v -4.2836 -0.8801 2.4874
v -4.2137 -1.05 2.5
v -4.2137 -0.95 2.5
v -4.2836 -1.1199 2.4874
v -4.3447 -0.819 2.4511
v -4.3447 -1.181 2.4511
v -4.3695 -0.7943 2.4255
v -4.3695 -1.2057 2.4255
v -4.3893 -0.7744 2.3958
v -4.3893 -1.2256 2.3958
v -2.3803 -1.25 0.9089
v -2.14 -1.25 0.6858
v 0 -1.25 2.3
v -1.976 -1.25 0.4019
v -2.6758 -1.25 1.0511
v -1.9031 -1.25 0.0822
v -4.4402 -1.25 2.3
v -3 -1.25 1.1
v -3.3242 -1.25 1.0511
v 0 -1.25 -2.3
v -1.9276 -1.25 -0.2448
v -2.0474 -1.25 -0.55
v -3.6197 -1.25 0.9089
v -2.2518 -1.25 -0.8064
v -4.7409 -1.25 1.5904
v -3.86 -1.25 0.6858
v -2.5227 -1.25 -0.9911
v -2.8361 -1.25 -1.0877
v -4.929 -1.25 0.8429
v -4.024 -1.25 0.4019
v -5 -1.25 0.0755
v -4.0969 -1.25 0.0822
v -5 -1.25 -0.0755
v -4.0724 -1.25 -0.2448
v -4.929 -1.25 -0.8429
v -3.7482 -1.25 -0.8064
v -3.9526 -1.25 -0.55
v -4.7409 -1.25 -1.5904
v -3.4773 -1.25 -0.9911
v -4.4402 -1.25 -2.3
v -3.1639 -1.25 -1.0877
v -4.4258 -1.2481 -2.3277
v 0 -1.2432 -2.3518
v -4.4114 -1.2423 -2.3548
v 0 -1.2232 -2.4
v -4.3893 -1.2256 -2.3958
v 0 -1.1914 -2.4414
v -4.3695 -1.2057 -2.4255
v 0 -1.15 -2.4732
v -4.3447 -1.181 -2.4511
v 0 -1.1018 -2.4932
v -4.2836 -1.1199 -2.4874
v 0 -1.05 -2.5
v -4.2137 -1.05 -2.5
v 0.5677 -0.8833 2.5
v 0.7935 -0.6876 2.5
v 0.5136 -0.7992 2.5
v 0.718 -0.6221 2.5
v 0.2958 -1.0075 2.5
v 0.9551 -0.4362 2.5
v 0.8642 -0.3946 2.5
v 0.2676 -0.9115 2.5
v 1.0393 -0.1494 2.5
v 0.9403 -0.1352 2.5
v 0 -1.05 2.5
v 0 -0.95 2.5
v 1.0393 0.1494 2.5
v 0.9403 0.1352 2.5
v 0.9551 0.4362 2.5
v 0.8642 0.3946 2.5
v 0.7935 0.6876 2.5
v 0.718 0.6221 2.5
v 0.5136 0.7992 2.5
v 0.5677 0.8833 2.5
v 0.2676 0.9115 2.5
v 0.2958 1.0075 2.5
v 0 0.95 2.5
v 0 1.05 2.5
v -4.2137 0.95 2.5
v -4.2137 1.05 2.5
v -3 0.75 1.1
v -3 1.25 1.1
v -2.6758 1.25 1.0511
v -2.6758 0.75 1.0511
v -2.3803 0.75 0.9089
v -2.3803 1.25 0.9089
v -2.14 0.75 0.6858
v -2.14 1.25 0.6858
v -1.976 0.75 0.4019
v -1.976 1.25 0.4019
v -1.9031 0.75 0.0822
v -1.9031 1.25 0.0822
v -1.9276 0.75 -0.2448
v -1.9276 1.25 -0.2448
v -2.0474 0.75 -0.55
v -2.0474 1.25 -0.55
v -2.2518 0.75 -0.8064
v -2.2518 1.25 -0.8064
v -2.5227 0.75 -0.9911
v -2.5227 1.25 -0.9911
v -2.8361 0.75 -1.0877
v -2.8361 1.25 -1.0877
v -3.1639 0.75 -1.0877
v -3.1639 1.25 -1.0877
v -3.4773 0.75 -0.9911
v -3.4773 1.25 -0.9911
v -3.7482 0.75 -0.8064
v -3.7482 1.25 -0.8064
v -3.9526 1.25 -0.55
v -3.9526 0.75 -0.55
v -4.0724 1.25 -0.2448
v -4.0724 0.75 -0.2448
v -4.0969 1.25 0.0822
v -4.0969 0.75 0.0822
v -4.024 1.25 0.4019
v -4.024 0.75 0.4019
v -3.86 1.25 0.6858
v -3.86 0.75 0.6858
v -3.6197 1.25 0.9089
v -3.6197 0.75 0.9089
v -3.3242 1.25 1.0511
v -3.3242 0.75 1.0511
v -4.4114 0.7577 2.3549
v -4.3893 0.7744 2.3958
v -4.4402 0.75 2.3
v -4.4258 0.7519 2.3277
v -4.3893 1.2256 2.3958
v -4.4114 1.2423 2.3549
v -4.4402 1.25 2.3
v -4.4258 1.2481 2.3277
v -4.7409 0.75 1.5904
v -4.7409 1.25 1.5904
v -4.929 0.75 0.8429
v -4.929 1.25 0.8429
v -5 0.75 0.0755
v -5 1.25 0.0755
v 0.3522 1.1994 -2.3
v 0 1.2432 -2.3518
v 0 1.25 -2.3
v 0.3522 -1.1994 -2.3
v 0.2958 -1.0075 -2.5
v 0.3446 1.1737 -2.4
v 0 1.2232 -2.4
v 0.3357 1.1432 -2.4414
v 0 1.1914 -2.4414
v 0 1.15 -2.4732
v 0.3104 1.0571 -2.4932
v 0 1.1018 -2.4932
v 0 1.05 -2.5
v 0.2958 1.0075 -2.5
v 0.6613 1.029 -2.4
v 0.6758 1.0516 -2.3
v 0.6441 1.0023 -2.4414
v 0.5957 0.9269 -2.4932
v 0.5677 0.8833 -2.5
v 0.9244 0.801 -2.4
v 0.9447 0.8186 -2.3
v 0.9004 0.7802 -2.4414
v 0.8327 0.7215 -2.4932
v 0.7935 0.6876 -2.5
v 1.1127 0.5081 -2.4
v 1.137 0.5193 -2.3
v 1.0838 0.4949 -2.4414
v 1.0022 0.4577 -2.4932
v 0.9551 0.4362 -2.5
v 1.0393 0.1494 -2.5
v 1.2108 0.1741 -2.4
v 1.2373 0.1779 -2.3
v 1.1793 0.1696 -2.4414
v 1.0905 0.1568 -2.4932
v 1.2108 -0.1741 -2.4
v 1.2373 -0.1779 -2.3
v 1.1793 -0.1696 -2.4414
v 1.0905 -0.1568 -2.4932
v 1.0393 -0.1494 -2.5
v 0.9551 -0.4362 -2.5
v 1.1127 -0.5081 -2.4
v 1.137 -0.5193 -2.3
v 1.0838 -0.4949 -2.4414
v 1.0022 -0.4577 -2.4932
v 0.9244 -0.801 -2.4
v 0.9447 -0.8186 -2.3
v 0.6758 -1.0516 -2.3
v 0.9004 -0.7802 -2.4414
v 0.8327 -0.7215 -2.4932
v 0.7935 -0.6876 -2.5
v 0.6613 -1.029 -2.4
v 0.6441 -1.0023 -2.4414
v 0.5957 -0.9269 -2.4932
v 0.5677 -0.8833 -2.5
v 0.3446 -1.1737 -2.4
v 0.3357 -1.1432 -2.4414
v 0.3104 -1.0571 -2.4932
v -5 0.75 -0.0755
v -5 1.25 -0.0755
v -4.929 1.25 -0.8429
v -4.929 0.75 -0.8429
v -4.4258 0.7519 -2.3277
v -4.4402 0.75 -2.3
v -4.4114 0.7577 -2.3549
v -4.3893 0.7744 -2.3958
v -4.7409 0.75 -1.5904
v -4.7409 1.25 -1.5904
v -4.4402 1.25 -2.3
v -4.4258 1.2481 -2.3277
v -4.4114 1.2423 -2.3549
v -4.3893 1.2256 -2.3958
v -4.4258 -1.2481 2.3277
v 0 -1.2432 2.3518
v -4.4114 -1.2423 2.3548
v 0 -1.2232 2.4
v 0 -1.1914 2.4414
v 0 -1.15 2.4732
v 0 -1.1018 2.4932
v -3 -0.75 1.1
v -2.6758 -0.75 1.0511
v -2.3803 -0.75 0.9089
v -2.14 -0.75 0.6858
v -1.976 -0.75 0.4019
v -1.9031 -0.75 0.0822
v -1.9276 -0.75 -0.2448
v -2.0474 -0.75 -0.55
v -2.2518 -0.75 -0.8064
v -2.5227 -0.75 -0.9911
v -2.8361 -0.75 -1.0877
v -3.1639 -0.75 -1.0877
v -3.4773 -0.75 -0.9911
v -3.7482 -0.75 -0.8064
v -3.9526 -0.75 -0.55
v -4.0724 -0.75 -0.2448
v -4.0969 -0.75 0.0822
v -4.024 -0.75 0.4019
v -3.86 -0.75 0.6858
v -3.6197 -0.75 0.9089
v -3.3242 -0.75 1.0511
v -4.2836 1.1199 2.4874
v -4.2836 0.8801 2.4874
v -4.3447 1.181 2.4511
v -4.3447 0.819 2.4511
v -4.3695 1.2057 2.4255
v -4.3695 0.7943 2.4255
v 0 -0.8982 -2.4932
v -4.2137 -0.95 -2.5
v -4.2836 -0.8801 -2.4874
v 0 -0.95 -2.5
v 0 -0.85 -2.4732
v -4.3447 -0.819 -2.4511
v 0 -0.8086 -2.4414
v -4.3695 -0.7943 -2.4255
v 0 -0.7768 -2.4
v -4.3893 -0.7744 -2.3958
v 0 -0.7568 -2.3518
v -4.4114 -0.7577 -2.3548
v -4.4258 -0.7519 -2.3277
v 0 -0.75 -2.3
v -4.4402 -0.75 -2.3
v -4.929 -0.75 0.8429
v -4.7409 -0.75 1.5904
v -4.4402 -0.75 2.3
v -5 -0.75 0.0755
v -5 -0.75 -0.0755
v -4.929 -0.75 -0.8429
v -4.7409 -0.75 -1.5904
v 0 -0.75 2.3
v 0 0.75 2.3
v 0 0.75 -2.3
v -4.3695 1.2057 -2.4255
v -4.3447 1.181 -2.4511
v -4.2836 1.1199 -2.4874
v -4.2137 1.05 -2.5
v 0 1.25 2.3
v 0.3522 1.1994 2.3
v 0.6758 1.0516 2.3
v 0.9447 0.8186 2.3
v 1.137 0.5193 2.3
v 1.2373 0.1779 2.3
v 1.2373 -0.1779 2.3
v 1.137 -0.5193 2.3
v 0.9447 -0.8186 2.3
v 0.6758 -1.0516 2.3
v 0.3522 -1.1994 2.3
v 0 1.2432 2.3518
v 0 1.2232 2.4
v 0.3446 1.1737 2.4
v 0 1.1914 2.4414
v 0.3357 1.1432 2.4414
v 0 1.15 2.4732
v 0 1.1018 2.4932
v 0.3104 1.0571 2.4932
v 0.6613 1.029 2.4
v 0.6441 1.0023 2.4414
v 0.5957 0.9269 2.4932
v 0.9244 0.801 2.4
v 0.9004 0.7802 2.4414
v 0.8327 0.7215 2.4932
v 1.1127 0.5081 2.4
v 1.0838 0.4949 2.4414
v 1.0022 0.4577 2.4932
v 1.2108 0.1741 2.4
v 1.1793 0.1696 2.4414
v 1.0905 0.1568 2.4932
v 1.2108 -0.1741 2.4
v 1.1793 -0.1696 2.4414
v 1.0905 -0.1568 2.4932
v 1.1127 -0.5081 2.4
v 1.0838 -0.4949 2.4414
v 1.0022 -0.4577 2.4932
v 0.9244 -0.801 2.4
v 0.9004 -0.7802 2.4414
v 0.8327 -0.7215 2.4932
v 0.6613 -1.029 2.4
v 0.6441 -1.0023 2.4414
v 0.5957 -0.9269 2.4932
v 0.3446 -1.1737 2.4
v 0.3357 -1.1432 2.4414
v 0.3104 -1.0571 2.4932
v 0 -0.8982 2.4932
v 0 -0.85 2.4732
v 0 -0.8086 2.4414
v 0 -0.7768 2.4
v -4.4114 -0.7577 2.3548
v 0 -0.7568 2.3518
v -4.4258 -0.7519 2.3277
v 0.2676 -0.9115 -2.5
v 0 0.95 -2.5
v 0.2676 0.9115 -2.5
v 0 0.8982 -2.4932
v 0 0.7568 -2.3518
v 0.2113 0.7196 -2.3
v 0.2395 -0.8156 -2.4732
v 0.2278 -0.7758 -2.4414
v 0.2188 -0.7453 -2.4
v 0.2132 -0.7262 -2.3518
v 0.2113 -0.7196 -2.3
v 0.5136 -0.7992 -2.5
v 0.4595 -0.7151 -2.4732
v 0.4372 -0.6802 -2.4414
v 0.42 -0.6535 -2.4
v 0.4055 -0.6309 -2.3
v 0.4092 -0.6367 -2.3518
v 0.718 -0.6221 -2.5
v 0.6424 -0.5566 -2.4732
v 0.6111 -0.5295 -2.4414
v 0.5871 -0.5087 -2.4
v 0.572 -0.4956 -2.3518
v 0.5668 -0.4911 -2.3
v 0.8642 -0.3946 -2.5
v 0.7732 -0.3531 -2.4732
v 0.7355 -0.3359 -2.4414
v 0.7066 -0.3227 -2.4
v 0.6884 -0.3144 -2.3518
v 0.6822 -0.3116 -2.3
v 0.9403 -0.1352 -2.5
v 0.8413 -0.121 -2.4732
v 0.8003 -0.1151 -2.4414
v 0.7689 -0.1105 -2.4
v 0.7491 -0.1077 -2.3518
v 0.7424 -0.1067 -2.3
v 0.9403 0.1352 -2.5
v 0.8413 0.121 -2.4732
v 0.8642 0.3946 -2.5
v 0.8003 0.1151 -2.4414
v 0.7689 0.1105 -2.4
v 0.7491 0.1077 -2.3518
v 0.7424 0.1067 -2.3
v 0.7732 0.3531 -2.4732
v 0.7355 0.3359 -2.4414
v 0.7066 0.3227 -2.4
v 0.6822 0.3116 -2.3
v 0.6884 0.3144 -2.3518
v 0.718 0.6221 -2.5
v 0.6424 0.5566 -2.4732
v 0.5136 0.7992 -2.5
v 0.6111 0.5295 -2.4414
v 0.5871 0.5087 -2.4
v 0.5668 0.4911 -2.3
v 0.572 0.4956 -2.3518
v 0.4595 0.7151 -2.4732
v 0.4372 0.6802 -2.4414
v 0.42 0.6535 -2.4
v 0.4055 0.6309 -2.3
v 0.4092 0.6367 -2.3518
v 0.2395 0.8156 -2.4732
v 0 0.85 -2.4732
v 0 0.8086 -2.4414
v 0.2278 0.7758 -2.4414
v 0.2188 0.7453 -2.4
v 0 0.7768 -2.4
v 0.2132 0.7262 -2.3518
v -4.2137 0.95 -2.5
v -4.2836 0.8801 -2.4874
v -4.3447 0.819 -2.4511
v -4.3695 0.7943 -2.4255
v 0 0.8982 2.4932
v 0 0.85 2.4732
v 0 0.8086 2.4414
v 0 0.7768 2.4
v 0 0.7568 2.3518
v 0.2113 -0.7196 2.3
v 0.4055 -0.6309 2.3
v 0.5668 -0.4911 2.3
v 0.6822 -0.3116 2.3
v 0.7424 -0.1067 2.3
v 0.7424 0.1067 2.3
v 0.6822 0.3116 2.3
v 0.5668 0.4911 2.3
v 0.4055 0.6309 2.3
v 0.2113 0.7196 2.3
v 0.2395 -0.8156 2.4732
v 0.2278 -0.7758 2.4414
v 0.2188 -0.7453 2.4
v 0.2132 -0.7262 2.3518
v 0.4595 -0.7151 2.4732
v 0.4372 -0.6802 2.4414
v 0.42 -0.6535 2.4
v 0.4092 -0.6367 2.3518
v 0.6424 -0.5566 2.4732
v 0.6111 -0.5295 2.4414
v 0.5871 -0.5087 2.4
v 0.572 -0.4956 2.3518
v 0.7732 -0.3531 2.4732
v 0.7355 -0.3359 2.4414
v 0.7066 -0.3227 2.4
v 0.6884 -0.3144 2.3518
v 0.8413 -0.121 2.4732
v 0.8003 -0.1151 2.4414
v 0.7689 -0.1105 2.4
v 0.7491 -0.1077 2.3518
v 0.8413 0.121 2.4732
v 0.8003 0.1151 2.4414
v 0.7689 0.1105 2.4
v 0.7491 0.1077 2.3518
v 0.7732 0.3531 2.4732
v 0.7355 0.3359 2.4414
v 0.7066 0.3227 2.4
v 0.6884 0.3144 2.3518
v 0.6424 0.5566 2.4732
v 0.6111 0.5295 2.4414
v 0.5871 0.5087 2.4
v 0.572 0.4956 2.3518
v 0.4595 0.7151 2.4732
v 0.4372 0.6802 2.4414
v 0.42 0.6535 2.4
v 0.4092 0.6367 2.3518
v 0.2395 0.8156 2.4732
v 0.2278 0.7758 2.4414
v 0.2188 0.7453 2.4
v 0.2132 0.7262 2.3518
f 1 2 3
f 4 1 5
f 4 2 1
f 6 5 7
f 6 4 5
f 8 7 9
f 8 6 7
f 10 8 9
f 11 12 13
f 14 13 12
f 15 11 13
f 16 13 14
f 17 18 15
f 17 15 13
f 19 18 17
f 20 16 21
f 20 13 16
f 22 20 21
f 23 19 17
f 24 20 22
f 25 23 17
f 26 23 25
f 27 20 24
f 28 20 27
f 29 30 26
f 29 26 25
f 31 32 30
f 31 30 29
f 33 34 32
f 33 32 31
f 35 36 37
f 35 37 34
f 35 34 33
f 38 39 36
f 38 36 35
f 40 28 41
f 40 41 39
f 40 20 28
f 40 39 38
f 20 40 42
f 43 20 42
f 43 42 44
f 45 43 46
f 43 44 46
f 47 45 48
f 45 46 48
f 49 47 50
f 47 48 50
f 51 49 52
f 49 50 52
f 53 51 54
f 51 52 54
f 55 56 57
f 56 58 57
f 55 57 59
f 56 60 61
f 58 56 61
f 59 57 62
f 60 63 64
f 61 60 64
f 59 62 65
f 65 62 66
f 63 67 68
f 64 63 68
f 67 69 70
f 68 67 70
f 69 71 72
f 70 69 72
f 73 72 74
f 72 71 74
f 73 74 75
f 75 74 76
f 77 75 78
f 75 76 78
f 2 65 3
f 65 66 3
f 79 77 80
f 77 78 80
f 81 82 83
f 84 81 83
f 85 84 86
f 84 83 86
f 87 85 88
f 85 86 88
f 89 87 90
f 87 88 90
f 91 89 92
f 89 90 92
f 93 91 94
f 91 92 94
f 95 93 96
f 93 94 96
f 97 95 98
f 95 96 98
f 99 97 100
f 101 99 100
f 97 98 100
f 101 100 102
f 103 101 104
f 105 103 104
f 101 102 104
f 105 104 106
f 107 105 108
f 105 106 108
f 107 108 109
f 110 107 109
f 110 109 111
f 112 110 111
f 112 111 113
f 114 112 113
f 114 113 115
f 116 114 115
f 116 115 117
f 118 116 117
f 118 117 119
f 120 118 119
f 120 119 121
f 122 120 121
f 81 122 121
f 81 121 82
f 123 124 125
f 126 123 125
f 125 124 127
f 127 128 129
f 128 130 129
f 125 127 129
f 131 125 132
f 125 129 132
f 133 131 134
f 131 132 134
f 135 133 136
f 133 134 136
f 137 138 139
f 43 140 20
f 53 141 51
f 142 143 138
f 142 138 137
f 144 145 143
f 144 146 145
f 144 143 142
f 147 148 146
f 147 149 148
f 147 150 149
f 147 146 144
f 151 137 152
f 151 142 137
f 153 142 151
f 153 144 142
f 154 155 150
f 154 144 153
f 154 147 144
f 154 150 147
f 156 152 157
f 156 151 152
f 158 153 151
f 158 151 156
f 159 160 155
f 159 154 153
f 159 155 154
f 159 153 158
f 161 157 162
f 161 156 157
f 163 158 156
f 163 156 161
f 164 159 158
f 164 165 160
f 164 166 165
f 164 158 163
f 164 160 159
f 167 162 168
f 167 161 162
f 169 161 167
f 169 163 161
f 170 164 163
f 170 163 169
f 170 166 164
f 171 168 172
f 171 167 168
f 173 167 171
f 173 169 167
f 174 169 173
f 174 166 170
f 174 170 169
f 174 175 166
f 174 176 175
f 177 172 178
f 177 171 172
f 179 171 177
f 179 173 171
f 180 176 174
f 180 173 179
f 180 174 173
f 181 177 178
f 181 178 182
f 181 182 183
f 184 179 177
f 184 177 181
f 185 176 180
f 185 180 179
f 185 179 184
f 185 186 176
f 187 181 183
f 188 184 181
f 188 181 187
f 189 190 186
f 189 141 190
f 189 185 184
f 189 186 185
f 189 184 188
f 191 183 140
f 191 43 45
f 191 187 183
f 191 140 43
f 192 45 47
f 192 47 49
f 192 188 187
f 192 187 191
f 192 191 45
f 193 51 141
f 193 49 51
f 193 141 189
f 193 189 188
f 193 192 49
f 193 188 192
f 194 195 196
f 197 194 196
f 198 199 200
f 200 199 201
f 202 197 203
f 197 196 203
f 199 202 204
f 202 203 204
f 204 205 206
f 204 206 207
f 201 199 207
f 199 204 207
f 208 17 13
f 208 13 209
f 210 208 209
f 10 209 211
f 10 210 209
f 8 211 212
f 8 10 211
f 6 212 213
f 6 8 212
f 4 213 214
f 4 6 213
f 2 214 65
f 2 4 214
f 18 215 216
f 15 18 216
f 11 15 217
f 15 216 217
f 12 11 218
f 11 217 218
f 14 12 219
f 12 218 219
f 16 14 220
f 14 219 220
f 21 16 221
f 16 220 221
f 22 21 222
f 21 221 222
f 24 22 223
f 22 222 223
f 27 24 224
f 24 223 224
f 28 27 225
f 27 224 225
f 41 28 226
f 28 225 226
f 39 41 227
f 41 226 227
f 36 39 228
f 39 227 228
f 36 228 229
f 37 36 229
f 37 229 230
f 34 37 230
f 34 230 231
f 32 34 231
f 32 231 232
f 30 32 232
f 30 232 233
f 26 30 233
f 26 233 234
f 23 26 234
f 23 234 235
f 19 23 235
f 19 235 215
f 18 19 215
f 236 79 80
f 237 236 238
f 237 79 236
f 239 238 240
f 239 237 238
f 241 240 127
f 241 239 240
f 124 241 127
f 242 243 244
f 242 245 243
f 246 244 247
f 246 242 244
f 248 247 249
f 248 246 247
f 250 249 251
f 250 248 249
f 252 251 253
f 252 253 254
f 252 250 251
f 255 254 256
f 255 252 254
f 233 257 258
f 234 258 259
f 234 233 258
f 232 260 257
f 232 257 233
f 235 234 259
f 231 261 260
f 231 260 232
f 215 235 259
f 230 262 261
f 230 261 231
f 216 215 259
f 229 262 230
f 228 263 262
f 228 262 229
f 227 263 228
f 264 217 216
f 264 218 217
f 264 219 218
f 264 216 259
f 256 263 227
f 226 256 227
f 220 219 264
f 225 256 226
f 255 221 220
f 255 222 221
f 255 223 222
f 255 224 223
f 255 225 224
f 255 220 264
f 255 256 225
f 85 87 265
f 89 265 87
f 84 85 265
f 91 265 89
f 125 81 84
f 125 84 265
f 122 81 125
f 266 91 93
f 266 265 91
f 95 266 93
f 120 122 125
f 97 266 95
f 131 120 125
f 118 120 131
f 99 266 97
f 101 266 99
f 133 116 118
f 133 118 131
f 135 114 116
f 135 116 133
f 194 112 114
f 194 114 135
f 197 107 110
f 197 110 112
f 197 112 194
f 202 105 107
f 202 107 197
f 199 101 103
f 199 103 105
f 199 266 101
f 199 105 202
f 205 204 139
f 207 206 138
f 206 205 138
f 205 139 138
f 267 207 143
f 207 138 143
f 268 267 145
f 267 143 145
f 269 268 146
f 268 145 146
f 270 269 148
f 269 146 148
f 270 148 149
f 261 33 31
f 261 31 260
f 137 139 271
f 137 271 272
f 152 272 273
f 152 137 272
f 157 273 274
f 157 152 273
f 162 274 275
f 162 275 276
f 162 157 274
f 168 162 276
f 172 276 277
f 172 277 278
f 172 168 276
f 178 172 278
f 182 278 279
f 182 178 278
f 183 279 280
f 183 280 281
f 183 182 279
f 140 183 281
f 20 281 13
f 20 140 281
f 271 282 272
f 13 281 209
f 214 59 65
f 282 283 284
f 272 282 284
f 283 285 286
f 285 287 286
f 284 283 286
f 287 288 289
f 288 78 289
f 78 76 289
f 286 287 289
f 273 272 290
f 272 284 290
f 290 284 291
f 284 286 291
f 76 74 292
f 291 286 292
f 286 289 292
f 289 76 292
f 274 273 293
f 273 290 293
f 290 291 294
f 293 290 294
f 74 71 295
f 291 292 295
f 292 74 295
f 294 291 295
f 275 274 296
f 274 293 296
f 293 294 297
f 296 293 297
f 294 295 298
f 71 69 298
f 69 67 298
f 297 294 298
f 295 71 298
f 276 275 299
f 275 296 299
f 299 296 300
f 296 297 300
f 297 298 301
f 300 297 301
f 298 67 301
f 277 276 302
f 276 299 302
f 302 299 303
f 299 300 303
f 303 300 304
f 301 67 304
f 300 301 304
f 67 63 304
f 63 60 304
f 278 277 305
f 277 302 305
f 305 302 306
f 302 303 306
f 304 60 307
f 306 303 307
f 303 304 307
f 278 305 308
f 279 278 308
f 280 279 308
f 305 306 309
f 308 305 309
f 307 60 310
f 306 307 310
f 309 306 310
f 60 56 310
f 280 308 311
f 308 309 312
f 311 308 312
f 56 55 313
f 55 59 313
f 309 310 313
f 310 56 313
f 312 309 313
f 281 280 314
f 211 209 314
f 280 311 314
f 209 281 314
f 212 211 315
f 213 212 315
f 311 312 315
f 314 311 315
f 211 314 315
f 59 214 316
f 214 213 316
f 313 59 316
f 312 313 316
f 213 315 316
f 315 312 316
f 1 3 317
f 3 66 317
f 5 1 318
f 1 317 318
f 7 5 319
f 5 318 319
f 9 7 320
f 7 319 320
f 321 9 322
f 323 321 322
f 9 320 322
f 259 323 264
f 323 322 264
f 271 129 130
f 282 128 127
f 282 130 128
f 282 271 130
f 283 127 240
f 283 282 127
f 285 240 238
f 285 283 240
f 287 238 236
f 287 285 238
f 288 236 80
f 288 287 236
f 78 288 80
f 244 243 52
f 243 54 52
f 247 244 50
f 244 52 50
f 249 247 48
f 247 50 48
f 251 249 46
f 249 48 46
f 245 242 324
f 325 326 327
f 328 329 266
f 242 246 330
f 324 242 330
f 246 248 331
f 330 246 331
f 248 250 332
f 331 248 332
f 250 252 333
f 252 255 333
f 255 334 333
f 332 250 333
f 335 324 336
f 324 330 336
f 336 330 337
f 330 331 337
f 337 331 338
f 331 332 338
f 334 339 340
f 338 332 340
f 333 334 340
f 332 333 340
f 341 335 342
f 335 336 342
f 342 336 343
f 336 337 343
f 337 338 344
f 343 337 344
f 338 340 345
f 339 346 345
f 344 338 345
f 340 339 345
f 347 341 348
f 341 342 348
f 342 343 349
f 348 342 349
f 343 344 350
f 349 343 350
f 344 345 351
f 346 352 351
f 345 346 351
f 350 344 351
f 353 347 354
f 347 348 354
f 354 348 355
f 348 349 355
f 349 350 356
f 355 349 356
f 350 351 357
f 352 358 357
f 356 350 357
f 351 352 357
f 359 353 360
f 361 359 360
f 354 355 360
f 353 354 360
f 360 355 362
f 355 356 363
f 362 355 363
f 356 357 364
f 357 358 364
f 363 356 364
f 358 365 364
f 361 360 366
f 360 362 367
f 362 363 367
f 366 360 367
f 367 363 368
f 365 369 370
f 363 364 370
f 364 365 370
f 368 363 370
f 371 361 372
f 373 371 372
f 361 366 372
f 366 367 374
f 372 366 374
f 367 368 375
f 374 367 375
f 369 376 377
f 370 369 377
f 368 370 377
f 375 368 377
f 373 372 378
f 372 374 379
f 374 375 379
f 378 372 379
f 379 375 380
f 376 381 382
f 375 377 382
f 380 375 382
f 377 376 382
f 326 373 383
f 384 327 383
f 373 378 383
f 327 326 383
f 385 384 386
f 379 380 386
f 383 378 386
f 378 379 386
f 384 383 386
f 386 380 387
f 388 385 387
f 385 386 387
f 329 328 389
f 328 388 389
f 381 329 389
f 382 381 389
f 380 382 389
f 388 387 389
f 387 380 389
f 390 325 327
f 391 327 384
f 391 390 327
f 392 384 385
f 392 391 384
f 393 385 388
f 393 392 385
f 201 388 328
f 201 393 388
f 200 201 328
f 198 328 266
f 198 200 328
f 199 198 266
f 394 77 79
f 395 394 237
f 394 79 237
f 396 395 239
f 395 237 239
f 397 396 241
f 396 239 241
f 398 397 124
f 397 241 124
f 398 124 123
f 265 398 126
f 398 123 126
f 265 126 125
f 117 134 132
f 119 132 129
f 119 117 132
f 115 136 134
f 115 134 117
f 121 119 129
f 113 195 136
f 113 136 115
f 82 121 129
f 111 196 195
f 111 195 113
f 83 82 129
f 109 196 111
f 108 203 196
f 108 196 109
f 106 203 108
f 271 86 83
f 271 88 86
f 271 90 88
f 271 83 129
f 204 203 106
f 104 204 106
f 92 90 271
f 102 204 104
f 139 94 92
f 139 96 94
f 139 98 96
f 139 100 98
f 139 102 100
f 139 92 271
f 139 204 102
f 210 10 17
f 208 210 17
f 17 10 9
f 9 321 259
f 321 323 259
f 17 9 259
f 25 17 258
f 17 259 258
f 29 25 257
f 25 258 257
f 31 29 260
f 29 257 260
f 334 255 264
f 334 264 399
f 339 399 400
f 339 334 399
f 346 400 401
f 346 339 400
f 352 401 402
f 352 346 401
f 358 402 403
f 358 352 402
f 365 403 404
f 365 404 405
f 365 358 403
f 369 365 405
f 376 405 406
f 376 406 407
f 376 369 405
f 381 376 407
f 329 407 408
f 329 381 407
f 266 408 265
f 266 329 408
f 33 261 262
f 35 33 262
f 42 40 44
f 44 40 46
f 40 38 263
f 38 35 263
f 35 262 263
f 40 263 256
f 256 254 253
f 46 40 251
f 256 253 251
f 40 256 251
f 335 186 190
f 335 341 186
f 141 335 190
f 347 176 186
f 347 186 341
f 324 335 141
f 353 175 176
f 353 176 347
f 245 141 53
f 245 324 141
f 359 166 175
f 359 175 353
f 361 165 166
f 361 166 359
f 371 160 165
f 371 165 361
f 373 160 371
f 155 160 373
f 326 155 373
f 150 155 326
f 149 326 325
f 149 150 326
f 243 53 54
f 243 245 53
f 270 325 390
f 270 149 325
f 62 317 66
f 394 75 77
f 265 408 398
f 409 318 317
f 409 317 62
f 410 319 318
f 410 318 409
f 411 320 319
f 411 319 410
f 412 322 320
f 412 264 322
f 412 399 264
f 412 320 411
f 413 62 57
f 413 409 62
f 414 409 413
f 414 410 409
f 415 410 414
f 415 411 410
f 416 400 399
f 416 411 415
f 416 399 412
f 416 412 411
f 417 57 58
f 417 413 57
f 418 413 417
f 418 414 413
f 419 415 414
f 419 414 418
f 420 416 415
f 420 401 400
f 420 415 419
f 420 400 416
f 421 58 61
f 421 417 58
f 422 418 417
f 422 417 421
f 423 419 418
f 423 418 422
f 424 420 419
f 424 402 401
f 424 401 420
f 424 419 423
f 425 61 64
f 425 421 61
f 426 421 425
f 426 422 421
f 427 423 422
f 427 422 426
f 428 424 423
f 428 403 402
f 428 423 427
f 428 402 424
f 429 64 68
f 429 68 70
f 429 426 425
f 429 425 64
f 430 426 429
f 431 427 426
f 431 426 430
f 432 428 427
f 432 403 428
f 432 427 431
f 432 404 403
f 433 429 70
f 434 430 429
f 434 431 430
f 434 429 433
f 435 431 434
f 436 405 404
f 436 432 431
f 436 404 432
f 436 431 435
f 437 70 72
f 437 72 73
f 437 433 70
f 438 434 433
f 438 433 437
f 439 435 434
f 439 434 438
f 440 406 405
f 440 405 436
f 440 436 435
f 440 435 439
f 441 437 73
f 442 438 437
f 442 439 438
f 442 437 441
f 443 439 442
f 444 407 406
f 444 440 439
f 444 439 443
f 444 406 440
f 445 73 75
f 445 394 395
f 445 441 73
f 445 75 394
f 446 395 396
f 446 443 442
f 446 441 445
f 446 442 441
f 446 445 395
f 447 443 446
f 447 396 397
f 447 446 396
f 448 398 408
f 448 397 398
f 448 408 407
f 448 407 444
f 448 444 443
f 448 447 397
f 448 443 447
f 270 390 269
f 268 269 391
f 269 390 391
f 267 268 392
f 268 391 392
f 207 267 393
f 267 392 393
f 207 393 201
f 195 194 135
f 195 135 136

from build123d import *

# Parameters (mm, degrees)
SALIENTE_EXTRUIR1_DEPTH      = 2.5
SALIENTE_EXTRUIR1_DEPTH_BACK = 2.5
CROQUIS2_R                   = 1.1
CORTAR_EXTRUIR1_DEPTH        = 7.123724357
REDONDEO1_R                  = 0.2
REDONDEO2_R                  = 0.2


with BuildPart() as part:
    # Croquis1 → Saliente-Extruir1 (new, two sides: drawn at the far end of the back side and taken through both)
    with BuildSketch(Plane.XY.offset(-SALIENTE_EXTRUIR1_DEPTH_BACK)):
        with BuildLine():
            Line((-5, 1.25), (0, 1.25))
            ThreePointArc((0, 1.25), (1.25, 0), (0, -1.25))
            Line((0, -1.25), (-5, -1.25))
            Line((-5, -1.25), (-5, -0.75))
            Line((-5, -0.75), (0, -0.75))
            ThreePointArc((0, -0.75), (0.75, 0), (0, 0.75))
            Line((0, 0.75), (-5, 0.75))
            Line((-5, 0.75), (-5, 1.25))
        make_face()
    extrude(amount=SALIENTE_EXTRUIR1_DEPTH + SALIENTE_EXTRUIR1_DEPTH_BACK)

    # Croquis2 → Cortar-Extruir1 (cut, through all)
    with BuildSketch(Plane(origin=(0, 1.25, 0), x_dir=(1, 0, 0), z_dir=(0, 1, 0))):
        with BuildLine():
            Line((-5, 2.5), (-5, 0.075509846))
            ThreePointArc((-5, 0.075509846), (-4.820313987, 1.330516743), (-4.330785349, 2.5))
            Line((-4.330785349, 2.5), (-5, 2.5))
        make_face()
        with BuildLine():
            ThreePointArc((-4.330785349, -2.5), (-4.820313987, -1.330516743), (-5, -0.075509846))
            Line((-5, -0.075509846), (-5, -2.5))
            Line((-5, -2.5), (-4.330785349, -2.5))
        make_face()
        with Locations((-3, 0)):
            Circle(CROQUIS2_R)
    extrude(amount=-CORTAR_EXTRUIR1_DEPTH, mode=Mode.SUBTRACT)

    # Redondeo1
    redondeo1_edges = [part.edges().sort_by_distance(p)[0] for p in [
        (-2.165392674, -0.75, 2.5),
        (0.75, 0, 2.5),
        (-2.165392674, 0.75, 2.5),
        (-4.330785349, 1, 2.5),
        (-2.165392674, 1.25, 2.5),
        (1.25, 0, 2.5),
        (-2.165392674, -1.25, 2.5),
        (-4.330785349, -1, 2.5),
    ]]
    fillet(redondeo1_edges, radius=REDONDEO1_R)

    # Redondeo2
    redondeo2_edges = [part.edges().sort_by_distance(p)[0] for p in [
        (-2.165392674, 0.75, -2.5),
        (0.75, 0, -2.5),
        (-2.165392674, -0.75, -2.5),
        (-4.330785349, -1, -2.5),
        (-2.165392674, -1.25, -2.5),
        (1.25, 0, -2.5),
        (-2.165392674, 1.25, -2.5),
        (-4.330785349, 1, -2.5),
    ]]
    fillet(redondeo2_edges, radius=REDONDEO2_R)


solid = part.part
